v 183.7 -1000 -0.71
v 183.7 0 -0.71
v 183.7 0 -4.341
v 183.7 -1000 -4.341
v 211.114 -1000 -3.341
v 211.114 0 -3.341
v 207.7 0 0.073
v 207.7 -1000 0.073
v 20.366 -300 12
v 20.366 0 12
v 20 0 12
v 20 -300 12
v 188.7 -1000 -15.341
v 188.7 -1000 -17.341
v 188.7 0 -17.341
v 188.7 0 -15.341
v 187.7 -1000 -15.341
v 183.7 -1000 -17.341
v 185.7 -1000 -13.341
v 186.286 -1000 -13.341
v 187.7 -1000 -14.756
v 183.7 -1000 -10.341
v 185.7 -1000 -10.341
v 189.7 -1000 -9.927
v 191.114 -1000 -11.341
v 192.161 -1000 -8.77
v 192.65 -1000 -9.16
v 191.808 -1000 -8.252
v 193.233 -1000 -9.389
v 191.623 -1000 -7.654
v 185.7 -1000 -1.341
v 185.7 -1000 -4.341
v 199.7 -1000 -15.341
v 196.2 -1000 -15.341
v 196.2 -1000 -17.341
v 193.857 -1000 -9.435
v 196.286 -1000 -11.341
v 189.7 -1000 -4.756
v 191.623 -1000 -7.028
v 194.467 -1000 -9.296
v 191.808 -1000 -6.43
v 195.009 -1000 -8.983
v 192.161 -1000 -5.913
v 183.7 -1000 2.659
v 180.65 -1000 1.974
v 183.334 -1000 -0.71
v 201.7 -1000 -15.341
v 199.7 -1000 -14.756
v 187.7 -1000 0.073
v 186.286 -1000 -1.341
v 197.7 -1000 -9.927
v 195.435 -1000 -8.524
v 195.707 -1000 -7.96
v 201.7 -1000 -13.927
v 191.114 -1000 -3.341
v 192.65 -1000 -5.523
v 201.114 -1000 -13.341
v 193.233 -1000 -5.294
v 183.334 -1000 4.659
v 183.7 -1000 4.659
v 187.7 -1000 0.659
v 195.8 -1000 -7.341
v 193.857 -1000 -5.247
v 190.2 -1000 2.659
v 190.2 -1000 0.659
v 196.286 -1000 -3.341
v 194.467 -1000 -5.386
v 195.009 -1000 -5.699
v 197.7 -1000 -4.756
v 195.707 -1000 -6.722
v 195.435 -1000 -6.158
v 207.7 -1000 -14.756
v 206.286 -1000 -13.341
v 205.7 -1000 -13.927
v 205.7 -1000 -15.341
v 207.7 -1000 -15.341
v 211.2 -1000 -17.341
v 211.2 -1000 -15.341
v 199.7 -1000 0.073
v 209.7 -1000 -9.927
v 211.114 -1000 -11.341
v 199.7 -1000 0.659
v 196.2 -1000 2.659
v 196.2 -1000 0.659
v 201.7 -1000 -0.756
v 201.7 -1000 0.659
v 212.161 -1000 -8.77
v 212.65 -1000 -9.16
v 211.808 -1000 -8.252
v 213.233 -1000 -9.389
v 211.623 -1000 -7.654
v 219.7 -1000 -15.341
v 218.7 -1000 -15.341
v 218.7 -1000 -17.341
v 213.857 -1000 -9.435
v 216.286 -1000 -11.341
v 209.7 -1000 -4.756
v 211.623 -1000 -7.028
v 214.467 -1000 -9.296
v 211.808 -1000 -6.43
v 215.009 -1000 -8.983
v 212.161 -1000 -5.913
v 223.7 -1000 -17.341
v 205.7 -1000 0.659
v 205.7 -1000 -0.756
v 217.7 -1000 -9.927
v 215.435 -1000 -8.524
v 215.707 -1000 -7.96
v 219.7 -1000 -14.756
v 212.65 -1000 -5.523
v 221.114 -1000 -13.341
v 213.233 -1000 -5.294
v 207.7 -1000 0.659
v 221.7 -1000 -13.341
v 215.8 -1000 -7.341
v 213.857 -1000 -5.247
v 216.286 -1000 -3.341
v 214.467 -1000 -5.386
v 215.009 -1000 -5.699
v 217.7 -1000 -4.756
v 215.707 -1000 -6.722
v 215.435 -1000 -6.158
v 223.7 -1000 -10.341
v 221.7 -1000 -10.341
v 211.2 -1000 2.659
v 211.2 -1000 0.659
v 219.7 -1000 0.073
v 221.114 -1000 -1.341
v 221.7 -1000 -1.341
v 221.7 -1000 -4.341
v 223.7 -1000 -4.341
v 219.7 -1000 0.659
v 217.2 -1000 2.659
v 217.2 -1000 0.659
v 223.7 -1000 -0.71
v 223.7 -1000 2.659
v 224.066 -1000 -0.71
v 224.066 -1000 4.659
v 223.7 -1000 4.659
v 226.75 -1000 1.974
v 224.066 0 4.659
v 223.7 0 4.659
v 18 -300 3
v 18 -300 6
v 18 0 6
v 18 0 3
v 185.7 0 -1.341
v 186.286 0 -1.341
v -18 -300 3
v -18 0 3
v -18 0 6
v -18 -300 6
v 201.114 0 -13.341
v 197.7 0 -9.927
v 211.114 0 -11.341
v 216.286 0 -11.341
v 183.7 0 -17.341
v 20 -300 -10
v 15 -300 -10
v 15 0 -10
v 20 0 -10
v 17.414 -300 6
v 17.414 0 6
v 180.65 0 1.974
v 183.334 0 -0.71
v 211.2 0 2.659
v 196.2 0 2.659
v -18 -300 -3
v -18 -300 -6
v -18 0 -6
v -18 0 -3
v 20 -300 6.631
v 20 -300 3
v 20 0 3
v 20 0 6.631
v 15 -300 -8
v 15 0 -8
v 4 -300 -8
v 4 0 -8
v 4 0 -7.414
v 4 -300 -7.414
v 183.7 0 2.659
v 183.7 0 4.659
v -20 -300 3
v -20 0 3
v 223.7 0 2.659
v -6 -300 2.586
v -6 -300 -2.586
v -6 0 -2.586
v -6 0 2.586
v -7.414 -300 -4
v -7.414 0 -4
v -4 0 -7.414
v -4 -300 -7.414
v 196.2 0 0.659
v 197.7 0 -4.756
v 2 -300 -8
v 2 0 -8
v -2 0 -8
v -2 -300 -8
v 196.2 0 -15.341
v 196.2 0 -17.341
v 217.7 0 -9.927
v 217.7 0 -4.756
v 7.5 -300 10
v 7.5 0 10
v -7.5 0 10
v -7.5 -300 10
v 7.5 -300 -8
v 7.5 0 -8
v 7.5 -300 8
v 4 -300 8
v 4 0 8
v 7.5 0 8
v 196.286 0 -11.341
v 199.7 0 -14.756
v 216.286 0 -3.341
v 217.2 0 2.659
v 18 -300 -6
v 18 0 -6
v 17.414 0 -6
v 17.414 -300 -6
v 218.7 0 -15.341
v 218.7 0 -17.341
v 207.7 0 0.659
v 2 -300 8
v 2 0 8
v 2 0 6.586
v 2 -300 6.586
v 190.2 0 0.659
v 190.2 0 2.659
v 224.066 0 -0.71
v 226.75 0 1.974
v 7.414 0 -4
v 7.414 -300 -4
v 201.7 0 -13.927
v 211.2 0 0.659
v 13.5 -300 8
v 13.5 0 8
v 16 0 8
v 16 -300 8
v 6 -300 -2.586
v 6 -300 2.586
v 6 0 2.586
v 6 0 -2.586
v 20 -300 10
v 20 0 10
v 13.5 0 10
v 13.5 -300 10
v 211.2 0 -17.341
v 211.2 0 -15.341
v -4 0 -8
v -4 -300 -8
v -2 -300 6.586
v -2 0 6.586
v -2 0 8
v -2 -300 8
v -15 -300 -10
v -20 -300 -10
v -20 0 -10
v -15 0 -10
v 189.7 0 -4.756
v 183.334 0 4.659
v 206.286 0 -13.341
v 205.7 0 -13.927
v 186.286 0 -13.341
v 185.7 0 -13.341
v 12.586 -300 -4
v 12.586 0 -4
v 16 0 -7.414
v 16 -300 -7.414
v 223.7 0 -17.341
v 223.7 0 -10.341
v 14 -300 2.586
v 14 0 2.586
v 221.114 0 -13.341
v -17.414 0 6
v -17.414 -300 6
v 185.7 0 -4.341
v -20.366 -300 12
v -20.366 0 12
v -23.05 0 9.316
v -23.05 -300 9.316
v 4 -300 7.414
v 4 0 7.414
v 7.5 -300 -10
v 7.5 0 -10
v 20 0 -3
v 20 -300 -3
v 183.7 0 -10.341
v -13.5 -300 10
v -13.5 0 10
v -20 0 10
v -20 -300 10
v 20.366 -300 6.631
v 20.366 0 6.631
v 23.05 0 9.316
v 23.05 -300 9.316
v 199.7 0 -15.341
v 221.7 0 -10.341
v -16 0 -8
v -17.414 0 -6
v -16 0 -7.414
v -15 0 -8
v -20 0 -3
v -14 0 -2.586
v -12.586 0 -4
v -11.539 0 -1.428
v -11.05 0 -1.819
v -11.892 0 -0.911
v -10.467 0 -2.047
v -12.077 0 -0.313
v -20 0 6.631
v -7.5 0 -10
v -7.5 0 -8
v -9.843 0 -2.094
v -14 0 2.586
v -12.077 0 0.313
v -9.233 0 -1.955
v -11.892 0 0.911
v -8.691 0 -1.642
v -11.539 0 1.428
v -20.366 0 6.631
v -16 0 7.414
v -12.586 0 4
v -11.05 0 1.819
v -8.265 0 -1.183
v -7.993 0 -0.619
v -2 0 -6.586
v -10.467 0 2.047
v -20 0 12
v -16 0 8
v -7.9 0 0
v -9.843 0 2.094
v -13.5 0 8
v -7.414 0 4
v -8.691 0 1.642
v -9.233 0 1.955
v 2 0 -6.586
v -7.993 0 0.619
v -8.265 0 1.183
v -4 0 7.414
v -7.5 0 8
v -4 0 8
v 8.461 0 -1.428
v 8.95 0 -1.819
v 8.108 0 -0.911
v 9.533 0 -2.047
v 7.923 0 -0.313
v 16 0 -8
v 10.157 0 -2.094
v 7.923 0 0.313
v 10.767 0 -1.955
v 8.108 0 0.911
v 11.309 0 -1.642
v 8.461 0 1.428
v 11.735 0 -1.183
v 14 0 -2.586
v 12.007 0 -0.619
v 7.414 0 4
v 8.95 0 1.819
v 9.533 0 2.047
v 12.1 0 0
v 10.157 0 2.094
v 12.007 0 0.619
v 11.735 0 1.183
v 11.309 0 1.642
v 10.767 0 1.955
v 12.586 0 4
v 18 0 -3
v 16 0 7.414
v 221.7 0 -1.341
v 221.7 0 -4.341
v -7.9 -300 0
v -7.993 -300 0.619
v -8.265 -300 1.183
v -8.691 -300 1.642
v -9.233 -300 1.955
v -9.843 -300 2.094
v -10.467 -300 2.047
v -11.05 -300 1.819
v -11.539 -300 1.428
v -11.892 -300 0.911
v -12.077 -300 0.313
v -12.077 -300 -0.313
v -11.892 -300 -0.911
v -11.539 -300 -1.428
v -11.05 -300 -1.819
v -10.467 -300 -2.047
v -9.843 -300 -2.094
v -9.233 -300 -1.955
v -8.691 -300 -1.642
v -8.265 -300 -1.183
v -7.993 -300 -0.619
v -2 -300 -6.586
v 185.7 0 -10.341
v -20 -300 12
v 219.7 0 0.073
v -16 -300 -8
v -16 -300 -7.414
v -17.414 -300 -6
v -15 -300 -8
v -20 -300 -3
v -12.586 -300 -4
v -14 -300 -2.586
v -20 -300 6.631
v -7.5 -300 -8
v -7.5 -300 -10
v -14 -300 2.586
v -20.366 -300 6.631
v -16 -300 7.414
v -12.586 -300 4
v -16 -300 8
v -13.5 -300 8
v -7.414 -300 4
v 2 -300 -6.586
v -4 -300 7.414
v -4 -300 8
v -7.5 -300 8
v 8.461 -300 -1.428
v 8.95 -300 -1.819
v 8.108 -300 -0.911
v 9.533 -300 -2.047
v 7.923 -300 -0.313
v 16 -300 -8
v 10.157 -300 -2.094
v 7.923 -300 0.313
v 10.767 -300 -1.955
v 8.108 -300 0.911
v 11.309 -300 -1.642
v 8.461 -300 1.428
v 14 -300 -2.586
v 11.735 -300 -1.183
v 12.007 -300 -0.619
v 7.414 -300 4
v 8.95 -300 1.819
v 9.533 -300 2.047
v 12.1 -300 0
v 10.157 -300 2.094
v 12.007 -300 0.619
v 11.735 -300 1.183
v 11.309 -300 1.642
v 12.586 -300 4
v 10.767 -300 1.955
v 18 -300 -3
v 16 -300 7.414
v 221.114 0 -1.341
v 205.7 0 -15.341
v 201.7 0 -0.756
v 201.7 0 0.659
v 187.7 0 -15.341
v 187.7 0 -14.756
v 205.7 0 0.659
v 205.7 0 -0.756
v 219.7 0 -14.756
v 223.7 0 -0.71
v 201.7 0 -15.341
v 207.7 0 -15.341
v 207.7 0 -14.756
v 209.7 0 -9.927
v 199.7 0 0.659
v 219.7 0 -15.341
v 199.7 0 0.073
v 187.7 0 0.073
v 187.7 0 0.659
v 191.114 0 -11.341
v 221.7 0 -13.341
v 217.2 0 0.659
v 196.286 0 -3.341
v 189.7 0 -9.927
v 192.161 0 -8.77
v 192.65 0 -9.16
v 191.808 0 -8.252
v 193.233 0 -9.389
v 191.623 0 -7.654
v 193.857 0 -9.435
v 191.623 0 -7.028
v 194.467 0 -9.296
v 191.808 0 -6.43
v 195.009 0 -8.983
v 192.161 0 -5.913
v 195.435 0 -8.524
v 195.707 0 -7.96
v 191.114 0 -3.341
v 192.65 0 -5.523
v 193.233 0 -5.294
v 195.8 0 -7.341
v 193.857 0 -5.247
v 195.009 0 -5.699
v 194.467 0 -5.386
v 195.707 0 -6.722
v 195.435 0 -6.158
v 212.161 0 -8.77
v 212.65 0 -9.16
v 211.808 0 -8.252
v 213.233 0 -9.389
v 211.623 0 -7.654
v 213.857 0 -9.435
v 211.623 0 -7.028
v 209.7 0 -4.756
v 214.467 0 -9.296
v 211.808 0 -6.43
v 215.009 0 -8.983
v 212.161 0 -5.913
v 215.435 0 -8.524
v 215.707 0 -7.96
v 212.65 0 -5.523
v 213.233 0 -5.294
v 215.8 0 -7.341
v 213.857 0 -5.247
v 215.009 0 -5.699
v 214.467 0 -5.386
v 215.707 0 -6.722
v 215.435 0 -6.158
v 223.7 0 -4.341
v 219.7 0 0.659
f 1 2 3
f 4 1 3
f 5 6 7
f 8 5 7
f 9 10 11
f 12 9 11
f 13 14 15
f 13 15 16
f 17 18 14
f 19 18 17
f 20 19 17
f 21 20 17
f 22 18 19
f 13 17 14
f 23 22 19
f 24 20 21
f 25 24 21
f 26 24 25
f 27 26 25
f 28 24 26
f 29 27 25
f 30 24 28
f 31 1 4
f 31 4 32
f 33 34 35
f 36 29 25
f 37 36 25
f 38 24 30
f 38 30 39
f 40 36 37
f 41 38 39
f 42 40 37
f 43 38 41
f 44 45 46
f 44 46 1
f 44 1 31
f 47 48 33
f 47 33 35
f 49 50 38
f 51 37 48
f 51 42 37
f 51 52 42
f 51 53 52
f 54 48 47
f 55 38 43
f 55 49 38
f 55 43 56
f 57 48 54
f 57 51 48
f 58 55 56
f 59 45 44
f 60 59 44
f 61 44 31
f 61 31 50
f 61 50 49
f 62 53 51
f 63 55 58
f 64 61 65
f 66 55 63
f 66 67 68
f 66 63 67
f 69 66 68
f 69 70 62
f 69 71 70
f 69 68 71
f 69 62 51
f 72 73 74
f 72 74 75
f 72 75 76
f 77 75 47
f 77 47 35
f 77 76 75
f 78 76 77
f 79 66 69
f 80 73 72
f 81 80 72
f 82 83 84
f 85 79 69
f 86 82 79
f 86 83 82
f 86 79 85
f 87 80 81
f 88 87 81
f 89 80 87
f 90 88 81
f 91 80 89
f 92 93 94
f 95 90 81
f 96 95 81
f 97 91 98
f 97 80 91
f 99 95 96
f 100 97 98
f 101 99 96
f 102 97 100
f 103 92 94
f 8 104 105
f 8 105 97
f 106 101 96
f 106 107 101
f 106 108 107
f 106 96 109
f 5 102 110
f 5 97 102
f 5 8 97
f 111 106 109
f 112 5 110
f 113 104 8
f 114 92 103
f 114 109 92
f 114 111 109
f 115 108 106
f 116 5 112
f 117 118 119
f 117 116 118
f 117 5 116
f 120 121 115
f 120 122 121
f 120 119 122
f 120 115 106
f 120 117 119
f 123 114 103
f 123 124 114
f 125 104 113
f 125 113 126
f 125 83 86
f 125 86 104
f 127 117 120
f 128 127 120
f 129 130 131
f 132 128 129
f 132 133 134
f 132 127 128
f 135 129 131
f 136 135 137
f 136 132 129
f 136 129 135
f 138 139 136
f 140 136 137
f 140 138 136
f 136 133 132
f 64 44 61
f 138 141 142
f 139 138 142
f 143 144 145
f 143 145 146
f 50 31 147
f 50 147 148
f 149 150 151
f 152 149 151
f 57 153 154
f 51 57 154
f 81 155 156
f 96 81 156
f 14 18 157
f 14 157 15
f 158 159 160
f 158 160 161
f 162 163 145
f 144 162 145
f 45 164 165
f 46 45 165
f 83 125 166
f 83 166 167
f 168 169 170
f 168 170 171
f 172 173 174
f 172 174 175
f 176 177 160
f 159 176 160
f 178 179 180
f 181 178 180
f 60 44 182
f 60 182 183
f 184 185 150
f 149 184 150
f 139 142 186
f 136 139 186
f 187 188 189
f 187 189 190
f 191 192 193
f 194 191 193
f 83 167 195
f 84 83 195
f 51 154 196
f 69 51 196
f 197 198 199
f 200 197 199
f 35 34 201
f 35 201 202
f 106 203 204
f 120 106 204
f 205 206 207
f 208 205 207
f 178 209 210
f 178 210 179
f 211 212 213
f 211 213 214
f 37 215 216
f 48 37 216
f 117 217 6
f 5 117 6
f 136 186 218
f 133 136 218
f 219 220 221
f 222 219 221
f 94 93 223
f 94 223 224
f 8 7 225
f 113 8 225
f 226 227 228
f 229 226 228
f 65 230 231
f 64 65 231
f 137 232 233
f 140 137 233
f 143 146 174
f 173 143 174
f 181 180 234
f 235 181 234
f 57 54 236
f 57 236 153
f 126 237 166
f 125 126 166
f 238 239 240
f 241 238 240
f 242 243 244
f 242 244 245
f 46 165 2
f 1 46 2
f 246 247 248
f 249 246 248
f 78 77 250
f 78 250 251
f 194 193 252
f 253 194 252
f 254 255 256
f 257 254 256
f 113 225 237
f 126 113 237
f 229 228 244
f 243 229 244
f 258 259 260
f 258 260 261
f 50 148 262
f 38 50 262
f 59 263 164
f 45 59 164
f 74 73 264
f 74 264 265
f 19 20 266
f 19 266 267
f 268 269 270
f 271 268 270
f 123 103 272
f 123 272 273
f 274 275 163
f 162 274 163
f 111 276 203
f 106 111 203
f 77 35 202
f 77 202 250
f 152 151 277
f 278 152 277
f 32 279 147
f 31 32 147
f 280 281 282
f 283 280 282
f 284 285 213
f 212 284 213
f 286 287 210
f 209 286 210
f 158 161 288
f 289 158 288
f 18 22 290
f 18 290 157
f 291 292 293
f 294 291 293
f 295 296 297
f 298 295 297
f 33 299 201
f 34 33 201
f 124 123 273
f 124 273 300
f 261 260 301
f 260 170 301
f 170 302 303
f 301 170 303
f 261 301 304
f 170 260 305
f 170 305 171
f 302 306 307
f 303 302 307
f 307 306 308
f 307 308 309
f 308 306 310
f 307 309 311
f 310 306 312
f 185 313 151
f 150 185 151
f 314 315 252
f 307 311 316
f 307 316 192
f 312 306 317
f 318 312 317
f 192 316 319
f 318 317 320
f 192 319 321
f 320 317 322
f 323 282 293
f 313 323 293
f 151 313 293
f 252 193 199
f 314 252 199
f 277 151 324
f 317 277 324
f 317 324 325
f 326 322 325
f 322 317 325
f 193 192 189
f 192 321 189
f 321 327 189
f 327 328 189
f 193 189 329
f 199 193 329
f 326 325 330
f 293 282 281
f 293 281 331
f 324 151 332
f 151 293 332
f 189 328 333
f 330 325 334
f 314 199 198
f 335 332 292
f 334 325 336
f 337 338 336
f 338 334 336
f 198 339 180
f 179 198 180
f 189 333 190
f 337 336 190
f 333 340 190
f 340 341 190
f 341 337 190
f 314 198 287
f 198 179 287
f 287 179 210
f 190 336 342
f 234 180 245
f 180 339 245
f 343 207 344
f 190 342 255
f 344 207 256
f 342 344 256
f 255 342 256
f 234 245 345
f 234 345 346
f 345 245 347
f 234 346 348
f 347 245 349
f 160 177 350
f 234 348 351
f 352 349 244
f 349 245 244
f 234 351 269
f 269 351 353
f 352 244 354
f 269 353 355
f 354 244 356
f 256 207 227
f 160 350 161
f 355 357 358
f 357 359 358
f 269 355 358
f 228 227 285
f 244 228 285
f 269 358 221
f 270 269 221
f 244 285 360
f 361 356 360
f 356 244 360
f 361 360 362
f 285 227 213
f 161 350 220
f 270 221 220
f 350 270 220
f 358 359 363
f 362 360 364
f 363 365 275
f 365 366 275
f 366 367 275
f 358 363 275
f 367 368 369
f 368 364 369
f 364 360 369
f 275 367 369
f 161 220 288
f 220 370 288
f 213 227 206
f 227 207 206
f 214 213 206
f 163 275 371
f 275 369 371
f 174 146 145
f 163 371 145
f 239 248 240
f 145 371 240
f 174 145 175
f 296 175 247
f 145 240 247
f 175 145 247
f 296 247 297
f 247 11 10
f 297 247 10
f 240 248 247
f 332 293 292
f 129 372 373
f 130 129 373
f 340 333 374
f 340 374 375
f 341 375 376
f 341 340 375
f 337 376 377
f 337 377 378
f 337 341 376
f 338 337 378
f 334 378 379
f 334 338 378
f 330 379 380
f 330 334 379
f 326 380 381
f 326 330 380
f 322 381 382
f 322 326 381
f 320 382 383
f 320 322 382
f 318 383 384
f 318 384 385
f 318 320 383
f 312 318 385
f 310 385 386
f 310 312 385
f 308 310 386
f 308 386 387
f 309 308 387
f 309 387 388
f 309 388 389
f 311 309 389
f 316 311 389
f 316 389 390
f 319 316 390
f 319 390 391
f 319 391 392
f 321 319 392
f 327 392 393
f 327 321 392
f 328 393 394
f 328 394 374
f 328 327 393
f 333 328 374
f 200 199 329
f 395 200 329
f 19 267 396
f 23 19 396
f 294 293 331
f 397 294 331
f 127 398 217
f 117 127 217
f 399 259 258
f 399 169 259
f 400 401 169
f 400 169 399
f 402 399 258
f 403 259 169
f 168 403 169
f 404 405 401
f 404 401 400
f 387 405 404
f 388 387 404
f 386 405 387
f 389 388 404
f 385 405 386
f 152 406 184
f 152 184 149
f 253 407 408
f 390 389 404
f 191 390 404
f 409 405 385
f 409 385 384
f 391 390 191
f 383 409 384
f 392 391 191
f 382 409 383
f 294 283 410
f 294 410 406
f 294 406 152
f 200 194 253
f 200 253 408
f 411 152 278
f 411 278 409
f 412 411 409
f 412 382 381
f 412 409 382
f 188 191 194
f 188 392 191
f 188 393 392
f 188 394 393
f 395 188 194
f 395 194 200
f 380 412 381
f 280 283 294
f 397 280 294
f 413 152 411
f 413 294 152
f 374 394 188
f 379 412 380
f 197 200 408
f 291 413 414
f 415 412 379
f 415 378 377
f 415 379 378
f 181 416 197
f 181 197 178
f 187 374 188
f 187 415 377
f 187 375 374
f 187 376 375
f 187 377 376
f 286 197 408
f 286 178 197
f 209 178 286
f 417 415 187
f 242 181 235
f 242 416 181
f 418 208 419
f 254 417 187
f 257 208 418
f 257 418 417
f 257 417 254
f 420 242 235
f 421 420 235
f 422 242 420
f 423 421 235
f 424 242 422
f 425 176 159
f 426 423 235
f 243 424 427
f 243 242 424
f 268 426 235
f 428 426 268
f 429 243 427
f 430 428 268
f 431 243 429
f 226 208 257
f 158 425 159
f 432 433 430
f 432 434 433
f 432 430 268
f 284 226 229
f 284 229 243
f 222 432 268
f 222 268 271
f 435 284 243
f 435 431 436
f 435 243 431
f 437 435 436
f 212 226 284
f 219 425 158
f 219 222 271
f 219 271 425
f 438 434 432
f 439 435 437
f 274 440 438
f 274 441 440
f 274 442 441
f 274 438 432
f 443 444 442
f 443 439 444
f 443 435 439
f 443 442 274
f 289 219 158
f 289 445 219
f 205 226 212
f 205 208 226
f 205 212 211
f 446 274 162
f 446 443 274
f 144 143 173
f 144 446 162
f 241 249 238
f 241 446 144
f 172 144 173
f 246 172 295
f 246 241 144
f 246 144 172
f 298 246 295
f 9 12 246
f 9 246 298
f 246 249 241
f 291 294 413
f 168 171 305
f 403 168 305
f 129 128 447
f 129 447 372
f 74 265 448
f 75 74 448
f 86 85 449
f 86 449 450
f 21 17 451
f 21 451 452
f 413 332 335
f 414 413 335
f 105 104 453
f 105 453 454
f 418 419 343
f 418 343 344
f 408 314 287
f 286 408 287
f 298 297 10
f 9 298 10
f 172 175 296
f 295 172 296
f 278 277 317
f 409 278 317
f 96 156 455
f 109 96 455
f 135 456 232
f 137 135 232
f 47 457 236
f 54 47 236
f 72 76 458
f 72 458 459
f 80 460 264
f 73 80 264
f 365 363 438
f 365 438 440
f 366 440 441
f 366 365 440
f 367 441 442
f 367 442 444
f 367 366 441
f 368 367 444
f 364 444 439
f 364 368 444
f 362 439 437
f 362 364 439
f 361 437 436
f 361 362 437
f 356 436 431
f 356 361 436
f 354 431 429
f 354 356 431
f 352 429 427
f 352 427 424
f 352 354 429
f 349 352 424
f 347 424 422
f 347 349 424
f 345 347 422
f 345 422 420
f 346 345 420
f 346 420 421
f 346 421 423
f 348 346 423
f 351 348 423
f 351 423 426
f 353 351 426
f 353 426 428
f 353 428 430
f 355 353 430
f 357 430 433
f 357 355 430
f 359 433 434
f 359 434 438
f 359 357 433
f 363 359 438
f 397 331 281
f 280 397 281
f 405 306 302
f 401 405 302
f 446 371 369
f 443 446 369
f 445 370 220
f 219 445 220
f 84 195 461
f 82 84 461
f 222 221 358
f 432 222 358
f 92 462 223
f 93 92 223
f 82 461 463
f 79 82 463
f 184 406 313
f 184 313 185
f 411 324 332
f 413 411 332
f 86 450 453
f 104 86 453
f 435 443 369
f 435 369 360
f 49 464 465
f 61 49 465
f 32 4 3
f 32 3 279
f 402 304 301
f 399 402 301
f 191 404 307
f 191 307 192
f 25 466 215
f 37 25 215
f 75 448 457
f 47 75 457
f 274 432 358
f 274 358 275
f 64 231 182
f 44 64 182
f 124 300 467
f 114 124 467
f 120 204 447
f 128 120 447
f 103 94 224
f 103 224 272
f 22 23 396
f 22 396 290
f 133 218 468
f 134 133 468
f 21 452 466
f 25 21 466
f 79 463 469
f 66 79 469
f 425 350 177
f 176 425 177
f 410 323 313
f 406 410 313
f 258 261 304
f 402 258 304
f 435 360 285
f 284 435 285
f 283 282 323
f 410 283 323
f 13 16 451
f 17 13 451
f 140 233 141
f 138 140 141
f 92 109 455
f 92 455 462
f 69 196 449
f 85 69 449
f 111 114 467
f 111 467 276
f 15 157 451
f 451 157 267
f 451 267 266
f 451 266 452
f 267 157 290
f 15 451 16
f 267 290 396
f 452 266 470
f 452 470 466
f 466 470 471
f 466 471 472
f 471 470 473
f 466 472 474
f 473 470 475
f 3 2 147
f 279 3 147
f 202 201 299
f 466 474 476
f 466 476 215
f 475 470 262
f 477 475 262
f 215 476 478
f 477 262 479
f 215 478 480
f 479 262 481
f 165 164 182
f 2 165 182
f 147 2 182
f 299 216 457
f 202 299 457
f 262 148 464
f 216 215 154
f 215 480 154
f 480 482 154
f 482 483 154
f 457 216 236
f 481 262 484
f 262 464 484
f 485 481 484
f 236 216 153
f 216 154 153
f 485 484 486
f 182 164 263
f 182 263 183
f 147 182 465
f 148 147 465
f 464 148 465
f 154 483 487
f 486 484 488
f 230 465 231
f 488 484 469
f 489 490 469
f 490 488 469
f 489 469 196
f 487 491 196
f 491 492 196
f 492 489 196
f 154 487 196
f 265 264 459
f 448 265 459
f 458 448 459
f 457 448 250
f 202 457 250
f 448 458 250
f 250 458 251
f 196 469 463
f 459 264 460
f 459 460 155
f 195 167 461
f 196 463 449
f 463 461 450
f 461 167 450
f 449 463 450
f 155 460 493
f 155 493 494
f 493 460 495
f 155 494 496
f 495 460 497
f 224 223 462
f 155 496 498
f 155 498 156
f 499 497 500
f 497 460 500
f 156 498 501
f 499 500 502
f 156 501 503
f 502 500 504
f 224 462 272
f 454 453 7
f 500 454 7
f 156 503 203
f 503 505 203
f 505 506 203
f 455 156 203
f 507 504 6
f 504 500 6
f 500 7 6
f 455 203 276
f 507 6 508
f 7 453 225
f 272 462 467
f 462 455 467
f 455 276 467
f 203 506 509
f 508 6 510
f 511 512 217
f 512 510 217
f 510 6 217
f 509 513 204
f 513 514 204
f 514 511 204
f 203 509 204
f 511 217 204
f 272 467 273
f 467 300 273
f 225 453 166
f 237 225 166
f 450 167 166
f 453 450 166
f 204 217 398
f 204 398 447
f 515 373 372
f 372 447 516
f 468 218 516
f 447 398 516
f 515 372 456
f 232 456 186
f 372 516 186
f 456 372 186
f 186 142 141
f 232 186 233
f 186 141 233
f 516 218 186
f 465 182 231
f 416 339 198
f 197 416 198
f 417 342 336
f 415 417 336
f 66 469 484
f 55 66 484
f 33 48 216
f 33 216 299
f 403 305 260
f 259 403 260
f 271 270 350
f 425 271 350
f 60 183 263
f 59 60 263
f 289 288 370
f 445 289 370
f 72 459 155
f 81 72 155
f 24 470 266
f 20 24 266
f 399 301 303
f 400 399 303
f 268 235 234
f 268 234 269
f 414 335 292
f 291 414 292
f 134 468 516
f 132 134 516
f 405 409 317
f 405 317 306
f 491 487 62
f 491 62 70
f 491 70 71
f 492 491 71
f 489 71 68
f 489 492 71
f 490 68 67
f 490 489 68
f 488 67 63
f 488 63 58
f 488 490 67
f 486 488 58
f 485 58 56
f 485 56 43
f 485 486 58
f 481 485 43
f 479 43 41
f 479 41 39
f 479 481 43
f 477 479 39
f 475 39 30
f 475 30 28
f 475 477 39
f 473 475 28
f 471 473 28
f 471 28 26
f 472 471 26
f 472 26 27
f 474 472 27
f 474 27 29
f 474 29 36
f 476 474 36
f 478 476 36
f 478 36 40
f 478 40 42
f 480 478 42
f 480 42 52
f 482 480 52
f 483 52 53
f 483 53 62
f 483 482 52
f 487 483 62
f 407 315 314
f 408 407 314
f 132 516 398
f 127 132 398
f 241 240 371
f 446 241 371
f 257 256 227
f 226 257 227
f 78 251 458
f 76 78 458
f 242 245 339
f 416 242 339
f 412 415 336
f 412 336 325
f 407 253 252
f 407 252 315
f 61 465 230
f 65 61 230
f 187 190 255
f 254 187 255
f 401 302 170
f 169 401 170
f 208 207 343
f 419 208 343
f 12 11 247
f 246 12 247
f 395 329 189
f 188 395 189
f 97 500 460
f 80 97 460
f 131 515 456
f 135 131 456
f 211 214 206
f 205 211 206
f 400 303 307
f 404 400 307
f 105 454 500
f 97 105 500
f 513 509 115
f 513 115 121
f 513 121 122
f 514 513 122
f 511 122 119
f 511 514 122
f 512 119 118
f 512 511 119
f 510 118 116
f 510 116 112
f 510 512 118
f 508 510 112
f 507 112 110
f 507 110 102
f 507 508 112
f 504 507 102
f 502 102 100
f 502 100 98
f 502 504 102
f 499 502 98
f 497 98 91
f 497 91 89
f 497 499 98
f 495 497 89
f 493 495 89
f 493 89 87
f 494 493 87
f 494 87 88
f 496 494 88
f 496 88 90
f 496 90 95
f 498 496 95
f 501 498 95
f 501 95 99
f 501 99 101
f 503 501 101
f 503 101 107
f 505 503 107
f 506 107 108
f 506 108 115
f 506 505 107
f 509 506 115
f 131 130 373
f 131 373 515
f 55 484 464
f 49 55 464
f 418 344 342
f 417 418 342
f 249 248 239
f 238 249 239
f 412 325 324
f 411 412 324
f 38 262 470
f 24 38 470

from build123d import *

# Parameters (mm, degrees)
F0_R     = 2.1
F1_DEPTH = 300
F2_R     = 2.1
F3_DEPTH = 1000


with BuildPart() as f1:
    # F0 (on Front) → F1 (new body)
    with BuildSketch(Plane.XZ):
        Polygon((-18, 10), (-20, 10), (-20, 12), (-20.365542, 12), (-23.05, 9.315542), (-20.365542, 6.631084), (-20, 6.631084), (-20, 6), (-20, 3), (-18, 3), (-18, 6), (-17.414214, 6), (-14, 2.585786), (-14, -2.585786), (-17.414214, -6), (-18, -6), (-18, -3), (-20, -3), (-20, -6), (-20, -8), (-20, -10), (-15, -10), (-15, -8), (-16, -8), (-16, -7.414214), (-12.585786, -4), (-7.414214, -4), (-4, -7.414214), (-4, -8), (-7.5, -8), (-7.5, -10), (-4, -10), (-2, -10), (0, -10), (0, -8), (-2, -8), (-2, -6.585786), (-2.585786, -6), (-6, -2.585786), (-6, 2.585786), (-2.585786, 6), (-2, 6.585786), (-2, 8), (0, 8), (0, 10), (-2, 10), (-4, 10), (-7.5, 10), (-7.5, 8), (-4, 8), (-4, 7.414214), (-7.414214, 4), (-12.585786, 4), (-16, 7.414214), (-16, 8), (-13.5, 8), (-13.5, 10), (-16, 10), align=None)
        with Locations((-10, 0)):
            Circle(F0_R, mode=Mode.SUBTRACT)
        Polygon((2, 10), (0, 10), (0, 8), (2, 8), (2, 6.585786), (2.585786, 6), (6, 2.585786), (6, -2.585786), (2.585786, -6), (2, -6.585786), (2, -8), (0, -8), (0, -10), (2, -10), (4, -10), (7.5, -10), (7.5, -8), (4, -8), (4, -7.414214), (7.414214, -4), (12.585786, -4), (16, -7.414214), (16, -8), (15, -8), (15, -10), (20, -10), (20, -8), (20, -6), (20, -3), (18, -3), (18, -6), (17.414214, -6), (14, -2.585786), (14, 2.585786), (17.414214, 6), (18, 6), (18, 3), (20, 3), (20, 6), (20, 6.631084), (20.365542, 6.631084), (23.05, 9.315542), (20.365542, 12), (20, 12), (20, 10), (18, 10), (16, 10), (13.5, 10), (13.5, 8), (16, 8), (16, 7.414214), (12.585786, 4), (7.414214, 4), (4, 7.414214), (4, 8), (7.5, 8), (7.5, 10), (4, 10), align=None)
        with Locations((10, 0)):
            Circle(F0_R, mode=Mode.SUBTRACT)
    extrude(amount=F1_DEPTH)


with BuildPart() as f3:
    # F2 (on Front) → F3 (new body)
    with BuildSketch(Plane.XZ):
        Polygon((185.70004, 2.658694), (183.70004, 2.658694), (183.70004, 4.658694), (183.334498, 4.658694), (180.65004, 1.974236), (183.334498, -0.710222), (183.70004, -0.710222), (183.70004, -1.341306), (183.70004, -4.341306), (185.70004, -4.341306), (185.70004, -1.341306), (186.285826, -1.341306), (189.70004, -4.75552), (189.70004, -9.927093), (186.285826, -13.341306), (185.70004, -13.341306), (185.70004, -10.341306), (183.70004, -10.341306), (183.70004, -13.341306), (183.70004, -15.341306), (183.70004, -17.341306), (188.70004, -17.341306), (188.70004, -15.341306), (187.70004, -15.341306), (187.70004, -14.75552), (191.114254, -11.341306), (196.285826, -11.341306), (199.70004, -14.75552), (199.70004, -15.341306), (196.20004, -15.341306), (196.20004, -17.341306), (199.70004, -17.341306), (201.70004, -17.341306), (203.70004, -17.341306), (203.70004, -15.341306), (201.70004, -15.341306), (201.70004, -13.927093), (201.114254, -13.341306), (197.70004, -9.927093), (197.70004, -4.75552), (201.114254, -1.341306), (201.70004, -0.75552), (201.70004, 0.658694), (203.70004, 0.658694), (203.70004, 2.658694), (201.70004, 2.658694), (199.70004, 2.658694), (196.20004, 2.658694), (196.20004, 0.658694), (199.70004, 0.658694), (199.70004, 0.072907), (196.285826, -3.341306), (191.114254, -3.341306), (187.70004, 0.072907), (187.70004, 0.658694), (190.20004, 0.658694), (190.20004, 2.658694), (187.70004, 2.658694), align=None)
        with Locations((193.70004, -7.341306)):
            Circle(F2_R, mode=Mode.SUBTRACT)
        Polygon((205.70004, 2.658694), (203.70004, 2.658694), (203.70004, 0.658694), (205.70004, 0.658694), (205.70004, -0.75552), (206.285826, -1.341306), (209.70004, -4.75552), (209.70004, -9.927093), (206.285826, -13.341306), (205.70004, -13.927093), (205.70004, -15.341306), (203.70004, -15.341306), (203.70004, -17.341306), (205.70004, -17.341306), (207.70004, -17.341306), (211.20004, -17.341306), (211.20004, -15.341306), (207.70004, -15.341306), (207.70004, -14.75552), (211.114254, -11.341306), (216.285826, -11.341306), (219.70004, -14.75552), (219.70004, -15.341306), (218.70004, -15.341306), (218.70004, -17.341306), (223.70004, -17.341306), (223.70004, -15.341306), (223.70004, -13.341306), (223.70004, -10.341306), (221.70004, -10.341306), (221.70004, -13.341306), (221.114254, -13.341306), (217.70004, -9.927093), (217.70004, -4.75552), (221.114254, -1.341306), (221.70004, -1.341306), (221.70004, -4.341306), (223.70004, -4.341306), (223.70004, -1.341306), (223.70004, -0.710222), (224.065582, -0.710222), (226.75004, 1.974236), (224.065582, 4.658694), (223.70004, 4.658694), (223.70004, 2.658694), (221.70004, 2.658694), (219.70004, 2.658694), (217.20004, 2.658694), (217.20004, 0.658694), (219.70004, 0.658694), (219.70004, 0.072907), (216.285826, -3.341306), (211.114254, -3.341306), (207.70004, 0.072907), (207.70004, 0.658694), (211.20004, 0.658694), (211.20004, 2.658694), (207.70004, 2.658694), align=None)
        with Locations((213.70004, -7.341306)):
            Circle(F2_R, mode=Mode.SUBTRACT)
    extrude(amount=F3_DEPTH)


solid = Compound([f1.part, f3.part])
